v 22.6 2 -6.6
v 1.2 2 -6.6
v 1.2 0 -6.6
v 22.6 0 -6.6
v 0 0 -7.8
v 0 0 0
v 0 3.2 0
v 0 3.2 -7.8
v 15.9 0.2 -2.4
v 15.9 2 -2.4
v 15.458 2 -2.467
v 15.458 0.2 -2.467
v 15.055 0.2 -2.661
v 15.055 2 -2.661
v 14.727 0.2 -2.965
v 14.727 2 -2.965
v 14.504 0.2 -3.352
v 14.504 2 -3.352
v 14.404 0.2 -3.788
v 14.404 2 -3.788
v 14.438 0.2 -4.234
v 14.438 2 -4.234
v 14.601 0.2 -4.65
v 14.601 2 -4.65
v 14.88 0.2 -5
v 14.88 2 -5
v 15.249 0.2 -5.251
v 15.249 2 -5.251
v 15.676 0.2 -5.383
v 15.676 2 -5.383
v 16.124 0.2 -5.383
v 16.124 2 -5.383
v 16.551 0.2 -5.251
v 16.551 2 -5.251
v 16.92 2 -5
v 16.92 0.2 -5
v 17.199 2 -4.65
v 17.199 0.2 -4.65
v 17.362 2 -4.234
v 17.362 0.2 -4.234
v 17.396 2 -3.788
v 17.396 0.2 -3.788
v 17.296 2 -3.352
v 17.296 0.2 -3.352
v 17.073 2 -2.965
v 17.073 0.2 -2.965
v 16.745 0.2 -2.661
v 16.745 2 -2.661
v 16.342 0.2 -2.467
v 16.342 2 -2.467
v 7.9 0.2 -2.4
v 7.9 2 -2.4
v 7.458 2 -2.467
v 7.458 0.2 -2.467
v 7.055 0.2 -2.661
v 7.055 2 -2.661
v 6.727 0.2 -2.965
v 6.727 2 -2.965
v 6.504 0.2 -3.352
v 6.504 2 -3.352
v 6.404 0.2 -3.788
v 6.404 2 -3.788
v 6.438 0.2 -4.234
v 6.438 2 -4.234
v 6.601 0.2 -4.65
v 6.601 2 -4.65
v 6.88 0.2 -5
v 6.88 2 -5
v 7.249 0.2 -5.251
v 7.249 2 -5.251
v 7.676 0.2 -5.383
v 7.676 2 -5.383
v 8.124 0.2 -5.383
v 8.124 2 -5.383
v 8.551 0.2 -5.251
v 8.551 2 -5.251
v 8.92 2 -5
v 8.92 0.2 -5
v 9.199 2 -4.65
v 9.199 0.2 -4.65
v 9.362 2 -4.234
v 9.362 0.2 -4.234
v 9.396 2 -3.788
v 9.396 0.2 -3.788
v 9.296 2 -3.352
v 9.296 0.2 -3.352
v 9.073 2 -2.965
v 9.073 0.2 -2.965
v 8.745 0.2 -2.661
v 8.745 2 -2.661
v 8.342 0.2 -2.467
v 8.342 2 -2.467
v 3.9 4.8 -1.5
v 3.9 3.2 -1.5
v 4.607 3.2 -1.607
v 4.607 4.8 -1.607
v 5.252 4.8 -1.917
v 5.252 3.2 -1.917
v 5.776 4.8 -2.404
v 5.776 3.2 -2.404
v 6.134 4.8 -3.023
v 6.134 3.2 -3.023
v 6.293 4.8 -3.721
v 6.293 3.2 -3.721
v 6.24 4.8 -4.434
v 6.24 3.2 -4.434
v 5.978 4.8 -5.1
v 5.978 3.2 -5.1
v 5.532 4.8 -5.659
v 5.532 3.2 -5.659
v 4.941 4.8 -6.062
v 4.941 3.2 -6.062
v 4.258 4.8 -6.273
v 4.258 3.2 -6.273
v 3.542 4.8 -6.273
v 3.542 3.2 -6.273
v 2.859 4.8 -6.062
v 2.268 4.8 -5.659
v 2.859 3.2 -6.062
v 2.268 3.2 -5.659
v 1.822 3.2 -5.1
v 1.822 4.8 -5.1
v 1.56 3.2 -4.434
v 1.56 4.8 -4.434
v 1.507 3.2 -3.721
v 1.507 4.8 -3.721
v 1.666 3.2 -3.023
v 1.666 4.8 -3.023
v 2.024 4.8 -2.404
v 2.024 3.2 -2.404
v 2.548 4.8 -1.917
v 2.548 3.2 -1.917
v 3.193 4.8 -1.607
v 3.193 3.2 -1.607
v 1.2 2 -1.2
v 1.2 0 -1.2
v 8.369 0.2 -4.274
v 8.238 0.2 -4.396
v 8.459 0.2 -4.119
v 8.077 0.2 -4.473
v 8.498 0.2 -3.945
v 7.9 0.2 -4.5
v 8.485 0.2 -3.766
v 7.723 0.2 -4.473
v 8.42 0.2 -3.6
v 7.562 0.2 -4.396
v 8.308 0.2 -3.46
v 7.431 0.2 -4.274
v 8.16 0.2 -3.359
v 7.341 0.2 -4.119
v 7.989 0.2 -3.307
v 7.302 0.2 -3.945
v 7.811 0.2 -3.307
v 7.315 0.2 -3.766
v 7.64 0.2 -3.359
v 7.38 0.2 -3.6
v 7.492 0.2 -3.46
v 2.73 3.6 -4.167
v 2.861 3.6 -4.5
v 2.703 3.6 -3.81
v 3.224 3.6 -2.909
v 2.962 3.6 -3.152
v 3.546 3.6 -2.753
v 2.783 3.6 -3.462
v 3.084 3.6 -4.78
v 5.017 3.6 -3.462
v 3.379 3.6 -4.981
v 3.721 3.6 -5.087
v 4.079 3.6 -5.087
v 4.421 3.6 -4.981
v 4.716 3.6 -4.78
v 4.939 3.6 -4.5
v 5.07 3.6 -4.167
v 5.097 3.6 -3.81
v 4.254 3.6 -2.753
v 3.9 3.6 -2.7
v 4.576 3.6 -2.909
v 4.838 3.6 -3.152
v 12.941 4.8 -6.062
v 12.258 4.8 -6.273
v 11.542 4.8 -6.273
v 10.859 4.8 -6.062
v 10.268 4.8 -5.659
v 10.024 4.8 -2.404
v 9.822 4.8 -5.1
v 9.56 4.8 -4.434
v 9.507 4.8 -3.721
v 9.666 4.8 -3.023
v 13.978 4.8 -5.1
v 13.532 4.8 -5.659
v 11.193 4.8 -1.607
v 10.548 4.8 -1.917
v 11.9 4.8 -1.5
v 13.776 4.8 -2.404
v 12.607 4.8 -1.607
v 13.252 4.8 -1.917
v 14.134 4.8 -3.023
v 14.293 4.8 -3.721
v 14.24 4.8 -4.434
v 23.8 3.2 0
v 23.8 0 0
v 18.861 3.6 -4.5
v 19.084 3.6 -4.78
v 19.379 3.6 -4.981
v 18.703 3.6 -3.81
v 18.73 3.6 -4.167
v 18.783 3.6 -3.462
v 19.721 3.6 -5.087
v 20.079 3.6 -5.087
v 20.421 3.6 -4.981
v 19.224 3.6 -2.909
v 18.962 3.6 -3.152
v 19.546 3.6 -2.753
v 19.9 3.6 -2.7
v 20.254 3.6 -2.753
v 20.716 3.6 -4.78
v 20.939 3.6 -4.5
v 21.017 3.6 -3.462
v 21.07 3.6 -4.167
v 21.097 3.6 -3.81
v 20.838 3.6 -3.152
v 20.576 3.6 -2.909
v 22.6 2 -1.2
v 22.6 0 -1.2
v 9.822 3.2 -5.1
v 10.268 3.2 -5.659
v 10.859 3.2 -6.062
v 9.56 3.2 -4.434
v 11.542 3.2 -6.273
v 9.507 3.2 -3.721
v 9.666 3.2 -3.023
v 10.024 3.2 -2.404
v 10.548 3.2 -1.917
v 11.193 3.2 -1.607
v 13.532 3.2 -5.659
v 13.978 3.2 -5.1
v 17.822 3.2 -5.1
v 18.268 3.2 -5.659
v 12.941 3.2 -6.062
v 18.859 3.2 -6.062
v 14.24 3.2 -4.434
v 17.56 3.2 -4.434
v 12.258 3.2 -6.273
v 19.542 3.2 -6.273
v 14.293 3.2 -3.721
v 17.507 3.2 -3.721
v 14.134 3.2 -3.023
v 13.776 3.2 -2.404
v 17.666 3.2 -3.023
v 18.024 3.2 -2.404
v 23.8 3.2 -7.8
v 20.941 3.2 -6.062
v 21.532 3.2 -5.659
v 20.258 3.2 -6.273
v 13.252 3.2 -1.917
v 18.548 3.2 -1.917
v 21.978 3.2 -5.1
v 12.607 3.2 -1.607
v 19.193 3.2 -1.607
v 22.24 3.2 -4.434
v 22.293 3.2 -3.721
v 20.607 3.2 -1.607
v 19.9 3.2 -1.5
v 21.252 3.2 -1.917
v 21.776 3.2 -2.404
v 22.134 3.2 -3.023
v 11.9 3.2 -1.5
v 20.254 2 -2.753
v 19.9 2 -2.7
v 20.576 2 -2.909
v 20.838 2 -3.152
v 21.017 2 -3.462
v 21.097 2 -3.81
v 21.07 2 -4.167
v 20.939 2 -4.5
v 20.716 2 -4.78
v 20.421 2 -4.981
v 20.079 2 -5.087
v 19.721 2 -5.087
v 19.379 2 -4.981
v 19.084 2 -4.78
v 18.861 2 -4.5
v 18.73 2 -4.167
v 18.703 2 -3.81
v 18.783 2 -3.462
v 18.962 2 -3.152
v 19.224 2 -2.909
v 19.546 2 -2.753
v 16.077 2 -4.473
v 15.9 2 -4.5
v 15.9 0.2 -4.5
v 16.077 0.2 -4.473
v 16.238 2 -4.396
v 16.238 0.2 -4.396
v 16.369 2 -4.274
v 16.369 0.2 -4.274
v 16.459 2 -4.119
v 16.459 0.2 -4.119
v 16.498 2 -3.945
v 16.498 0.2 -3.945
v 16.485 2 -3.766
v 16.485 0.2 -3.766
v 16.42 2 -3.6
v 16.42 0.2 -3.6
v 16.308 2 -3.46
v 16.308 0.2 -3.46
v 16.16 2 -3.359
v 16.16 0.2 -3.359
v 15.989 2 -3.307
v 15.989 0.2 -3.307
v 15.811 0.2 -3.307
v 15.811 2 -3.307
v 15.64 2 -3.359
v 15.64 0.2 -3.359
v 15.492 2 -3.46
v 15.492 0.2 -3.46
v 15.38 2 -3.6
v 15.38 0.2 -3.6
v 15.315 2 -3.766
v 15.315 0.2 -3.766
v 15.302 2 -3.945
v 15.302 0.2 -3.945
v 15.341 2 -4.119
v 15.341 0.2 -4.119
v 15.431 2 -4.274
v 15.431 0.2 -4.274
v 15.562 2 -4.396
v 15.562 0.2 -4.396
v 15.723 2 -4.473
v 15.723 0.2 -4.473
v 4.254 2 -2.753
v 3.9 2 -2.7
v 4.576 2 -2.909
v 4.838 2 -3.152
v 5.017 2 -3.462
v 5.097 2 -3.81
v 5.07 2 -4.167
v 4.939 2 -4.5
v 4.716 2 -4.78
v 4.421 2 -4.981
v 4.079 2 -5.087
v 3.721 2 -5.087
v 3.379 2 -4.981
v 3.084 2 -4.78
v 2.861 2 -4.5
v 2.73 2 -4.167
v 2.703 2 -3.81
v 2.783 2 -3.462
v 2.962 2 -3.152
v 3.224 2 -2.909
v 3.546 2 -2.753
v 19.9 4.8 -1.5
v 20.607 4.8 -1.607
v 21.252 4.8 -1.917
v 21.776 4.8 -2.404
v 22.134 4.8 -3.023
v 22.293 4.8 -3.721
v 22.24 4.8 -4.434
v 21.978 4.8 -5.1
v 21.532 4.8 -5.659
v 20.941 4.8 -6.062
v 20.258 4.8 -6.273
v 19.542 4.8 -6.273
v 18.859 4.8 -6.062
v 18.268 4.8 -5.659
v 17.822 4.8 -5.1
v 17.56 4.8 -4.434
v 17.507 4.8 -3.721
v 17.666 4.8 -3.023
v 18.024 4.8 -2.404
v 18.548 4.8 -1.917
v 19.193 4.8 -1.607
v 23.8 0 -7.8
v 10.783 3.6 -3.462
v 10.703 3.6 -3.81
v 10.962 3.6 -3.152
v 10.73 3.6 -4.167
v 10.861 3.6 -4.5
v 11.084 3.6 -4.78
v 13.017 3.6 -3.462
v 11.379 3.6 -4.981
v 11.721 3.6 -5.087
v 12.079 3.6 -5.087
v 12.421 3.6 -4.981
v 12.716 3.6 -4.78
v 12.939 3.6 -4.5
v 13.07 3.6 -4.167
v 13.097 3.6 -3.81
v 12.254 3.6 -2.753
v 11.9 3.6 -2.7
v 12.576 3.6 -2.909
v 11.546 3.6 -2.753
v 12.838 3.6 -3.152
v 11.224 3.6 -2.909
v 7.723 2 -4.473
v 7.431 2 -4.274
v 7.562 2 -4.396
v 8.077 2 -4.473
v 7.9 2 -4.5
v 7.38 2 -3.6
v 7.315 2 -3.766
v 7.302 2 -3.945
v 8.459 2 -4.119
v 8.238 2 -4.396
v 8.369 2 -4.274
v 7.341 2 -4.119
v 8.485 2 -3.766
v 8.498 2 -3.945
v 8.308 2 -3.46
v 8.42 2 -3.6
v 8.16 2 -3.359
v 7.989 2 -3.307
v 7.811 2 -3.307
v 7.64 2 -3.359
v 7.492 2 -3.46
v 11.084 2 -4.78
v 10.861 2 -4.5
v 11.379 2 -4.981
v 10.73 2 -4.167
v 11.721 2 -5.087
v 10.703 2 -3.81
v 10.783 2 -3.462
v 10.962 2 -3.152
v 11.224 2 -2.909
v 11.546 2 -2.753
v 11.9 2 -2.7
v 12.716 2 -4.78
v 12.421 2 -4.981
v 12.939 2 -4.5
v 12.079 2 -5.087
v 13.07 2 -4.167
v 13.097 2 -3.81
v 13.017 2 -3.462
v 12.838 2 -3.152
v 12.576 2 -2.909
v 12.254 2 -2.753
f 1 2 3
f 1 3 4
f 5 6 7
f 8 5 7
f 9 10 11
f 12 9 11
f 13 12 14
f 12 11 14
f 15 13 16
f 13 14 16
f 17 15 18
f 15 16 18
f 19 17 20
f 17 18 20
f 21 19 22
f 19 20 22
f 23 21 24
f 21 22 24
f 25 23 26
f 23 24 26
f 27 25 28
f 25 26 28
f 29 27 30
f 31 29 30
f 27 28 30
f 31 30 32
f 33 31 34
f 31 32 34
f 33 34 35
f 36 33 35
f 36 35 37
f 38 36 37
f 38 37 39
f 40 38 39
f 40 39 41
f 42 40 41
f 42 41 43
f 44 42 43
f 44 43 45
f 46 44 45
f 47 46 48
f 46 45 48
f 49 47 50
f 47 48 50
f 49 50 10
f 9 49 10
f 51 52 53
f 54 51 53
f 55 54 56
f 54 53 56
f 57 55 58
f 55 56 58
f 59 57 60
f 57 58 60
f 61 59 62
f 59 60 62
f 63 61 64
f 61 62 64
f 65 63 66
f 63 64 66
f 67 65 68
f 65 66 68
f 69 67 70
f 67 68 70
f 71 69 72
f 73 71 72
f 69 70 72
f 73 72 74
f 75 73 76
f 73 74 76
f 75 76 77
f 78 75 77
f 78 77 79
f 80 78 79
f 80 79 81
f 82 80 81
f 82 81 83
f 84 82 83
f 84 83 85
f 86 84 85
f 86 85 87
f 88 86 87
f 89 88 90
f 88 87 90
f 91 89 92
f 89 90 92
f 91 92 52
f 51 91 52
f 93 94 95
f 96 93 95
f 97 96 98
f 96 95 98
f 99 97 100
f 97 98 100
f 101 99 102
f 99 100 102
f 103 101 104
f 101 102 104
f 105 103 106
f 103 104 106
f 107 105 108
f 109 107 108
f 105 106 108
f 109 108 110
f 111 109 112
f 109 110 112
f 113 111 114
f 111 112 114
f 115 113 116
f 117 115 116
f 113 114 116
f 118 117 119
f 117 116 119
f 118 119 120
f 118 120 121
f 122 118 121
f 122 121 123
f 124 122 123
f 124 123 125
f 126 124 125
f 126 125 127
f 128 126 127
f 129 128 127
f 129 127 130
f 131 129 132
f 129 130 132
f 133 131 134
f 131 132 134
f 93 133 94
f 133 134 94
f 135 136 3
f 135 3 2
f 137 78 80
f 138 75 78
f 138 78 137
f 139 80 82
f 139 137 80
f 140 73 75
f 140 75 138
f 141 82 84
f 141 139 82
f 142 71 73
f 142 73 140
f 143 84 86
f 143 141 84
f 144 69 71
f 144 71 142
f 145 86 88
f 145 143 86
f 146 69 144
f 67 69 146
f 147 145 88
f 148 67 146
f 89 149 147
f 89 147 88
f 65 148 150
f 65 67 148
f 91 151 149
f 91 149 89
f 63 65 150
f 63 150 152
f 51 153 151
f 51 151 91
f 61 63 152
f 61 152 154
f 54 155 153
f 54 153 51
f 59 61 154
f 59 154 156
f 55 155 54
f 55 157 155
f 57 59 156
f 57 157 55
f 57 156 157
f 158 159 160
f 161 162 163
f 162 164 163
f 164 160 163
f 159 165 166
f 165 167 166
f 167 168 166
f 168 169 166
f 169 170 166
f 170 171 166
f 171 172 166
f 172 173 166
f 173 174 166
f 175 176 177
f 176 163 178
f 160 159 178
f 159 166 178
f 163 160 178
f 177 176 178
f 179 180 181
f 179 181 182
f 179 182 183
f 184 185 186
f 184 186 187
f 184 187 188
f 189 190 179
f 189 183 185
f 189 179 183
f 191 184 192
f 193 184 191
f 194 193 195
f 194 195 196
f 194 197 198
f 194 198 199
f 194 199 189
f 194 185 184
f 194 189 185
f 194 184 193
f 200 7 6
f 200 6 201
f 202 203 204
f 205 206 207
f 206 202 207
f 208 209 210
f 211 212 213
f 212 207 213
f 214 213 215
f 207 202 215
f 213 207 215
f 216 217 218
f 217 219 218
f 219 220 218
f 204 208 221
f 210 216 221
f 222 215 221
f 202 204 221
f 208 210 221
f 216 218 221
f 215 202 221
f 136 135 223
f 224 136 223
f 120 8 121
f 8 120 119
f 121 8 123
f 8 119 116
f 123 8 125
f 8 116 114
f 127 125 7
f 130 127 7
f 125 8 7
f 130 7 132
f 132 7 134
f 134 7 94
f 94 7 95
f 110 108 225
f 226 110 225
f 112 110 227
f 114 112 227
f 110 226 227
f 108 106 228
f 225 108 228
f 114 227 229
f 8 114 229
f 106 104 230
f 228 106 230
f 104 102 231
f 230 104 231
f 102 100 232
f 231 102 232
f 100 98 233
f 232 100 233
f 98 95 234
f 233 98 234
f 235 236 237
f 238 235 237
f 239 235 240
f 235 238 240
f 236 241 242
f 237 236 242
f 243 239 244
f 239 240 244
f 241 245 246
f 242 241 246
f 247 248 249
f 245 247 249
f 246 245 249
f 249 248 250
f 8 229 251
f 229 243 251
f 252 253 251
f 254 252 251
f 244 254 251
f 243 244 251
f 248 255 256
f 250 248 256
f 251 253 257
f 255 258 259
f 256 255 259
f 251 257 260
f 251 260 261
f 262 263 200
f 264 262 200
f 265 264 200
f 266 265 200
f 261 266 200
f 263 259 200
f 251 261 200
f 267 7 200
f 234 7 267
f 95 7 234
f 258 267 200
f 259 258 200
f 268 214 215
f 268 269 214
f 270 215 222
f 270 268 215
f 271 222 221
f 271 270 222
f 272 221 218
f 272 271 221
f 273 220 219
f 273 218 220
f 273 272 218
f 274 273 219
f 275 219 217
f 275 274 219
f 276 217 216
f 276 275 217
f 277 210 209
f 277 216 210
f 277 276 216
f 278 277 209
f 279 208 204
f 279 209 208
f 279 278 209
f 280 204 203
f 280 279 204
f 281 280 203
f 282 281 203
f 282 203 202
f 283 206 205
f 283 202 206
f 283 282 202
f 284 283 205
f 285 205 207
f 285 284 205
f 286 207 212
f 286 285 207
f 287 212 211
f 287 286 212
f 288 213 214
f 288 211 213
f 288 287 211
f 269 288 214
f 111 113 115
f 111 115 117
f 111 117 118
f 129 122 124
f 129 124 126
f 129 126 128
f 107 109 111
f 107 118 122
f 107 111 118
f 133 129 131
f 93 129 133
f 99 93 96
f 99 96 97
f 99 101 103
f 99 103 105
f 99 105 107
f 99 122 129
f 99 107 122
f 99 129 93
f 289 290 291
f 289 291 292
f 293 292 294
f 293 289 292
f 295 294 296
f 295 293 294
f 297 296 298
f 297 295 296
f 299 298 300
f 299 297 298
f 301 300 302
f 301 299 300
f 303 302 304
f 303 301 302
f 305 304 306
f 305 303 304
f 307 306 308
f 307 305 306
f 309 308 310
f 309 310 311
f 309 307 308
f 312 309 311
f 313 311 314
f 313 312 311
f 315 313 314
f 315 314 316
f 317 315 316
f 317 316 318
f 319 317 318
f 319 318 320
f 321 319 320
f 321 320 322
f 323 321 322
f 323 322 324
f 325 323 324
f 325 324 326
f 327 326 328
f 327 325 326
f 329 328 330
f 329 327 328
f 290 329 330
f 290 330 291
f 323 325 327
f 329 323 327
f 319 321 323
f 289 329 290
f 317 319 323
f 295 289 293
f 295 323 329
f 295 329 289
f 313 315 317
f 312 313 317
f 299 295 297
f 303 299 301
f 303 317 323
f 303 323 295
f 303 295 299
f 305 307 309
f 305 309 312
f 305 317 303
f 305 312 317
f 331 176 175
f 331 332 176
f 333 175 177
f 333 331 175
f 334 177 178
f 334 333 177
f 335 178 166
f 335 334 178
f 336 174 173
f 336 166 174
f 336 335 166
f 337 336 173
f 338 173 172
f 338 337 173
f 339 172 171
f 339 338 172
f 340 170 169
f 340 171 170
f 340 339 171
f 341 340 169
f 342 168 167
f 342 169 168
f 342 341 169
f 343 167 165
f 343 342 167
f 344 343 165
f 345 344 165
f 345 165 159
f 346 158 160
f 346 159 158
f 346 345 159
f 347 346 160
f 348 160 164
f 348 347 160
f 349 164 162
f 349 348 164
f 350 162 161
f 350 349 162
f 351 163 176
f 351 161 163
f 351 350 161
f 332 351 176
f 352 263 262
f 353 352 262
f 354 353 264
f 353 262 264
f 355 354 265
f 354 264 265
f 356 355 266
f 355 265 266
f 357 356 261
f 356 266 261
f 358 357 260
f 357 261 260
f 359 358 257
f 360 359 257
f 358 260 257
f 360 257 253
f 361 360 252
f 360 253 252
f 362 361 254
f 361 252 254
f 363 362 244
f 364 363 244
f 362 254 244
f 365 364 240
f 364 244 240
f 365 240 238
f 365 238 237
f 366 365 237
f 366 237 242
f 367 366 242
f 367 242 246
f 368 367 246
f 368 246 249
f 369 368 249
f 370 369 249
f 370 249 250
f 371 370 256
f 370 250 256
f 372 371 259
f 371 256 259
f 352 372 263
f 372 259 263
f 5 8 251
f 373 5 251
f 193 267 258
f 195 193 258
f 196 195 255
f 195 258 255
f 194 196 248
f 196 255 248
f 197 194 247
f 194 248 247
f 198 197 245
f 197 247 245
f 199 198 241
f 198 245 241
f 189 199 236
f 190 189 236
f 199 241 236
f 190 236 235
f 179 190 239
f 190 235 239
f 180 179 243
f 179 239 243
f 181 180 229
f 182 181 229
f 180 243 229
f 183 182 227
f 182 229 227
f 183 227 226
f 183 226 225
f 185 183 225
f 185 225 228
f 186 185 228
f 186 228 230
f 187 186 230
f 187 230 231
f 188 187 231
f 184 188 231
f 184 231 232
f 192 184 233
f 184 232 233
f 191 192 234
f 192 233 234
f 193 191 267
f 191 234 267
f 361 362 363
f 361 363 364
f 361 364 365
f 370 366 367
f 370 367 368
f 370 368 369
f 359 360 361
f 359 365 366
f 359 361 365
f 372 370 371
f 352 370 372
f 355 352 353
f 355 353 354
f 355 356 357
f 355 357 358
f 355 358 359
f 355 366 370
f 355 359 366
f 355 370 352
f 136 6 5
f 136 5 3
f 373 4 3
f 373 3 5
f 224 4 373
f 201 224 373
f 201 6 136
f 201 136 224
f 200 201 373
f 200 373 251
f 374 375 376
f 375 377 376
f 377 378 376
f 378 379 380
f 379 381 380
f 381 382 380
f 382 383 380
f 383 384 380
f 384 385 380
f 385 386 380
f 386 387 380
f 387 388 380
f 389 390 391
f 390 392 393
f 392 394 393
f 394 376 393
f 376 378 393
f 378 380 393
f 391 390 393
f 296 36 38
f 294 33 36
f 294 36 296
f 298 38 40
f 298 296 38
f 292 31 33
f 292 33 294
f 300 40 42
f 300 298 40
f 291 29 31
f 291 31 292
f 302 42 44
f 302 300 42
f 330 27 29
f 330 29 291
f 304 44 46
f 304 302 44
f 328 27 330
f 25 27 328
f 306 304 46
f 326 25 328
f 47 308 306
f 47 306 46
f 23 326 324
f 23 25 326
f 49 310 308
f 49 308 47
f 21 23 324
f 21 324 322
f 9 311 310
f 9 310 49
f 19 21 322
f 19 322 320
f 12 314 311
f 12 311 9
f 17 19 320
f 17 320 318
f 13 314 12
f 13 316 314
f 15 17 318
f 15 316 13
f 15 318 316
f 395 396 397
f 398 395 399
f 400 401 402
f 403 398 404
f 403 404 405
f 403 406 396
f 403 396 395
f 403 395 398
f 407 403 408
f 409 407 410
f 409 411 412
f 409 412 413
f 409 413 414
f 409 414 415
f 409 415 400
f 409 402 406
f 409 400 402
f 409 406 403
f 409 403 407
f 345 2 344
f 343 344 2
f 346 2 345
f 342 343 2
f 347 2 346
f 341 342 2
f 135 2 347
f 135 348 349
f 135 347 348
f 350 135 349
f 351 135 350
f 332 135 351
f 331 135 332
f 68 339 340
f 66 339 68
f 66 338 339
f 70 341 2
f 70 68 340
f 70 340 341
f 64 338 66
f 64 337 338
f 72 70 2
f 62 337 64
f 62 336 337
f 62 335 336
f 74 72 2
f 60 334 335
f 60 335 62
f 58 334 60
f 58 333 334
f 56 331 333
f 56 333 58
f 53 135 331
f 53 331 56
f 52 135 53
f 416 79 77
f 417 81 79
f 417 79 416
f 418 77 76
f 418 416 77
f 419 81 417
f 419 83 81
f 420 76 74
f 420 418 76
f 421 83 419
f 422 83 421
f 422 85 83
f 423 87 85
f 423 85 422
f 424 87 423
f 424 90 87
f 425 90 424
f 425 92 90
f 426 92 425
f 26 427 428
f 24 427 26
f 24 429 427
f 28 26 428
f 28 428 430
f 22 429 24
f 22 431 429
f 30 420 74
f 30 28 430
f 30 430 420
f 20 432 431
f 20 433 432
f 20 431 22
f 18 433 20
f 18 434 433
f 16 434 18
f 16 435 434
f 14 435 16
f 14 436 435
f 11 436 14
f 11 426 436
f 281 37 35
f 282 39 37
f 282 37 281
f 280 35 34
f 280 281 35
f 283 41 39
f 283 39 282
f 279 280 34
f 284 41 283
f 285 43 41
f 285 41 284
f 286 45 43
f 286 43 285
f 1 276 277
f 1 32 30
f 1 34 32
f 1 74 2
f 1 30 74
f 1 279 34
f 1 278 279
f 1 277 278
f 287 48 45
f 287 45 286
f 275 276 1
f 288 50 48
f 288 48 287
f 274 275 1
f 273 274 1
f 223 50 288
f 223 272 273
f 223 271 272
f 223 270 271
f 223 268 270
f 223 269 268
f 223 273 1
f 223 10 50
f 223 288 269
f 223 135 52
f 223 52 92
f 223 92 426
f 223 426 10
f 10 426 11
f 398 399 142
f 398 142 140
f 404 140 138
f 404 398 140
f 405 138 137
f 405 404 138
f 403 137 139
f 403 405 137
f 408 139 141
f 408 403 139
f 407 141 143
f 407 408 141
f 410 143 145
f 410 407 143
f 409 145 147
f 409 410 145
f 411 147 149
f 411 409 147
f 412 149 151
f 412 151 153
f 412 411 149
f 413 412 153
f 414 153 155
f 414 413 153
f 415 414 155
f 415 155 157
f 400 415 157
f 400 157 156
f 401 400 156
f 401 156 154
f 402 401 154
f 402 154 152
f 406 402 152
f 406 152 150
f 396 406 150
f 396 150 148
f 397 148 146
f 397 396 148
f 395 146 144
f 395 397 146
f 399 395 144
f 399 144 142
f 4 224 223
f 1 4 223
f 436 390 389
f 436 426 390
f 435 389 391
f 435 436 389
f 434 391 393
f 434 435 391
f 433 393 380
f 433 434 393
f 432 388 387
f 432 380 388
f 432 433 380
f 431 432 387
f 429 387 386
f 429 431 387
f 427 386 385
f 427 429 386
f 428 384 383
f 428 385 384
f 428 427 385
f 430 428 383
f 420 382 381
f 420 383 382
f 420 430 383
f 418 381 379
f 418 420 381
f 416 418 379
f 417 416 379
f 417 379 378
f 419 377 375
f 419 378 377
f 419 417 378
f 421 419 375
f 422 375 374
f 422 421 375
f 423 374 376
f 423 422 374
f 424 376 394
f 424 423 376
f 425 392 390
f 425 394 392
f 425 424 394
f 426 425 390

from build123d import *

# Parameters (mm, degrees)
SKETCH1_W            = 23.8
SKETCH1_H            = 3.2
BOSS_EXTRUDE1_DEPTH  = 7.8
SKETCH2_R            = 2.4
BOSS_EXTRUDE2_DEPTH  = 1.6
LPATTERN1_COUNT      = 2
LPATTERN1_PITCH      = 8
LPATTERN1_COUNT_DIR2 = 4
LPATTERN1_PITCH_DIR2 = 8
SHELL1_T             = -1.2
SKETCH3_R            = 1.5
SKETCH3_R_2          = 0.6
BOSS_EXTRUDE3_DEPTH  = 1.8
LPATTERN2_COUNT      = 2
LPATTERN2_PITCH      = 8


with BuildPart() as part:
    # Sketch1 → Boss-Extrude1 (new body)
    with BuildSketch(Plane.XY):
        with Locations((11.9, 1.6)):
            Rectangle(SKETCH1_W, SKETCH1_H)
    extrude(amount=-BOSS_EXTRUDE1_DEPTH)

    # Sketch2 → Boss-Extrude2 (add)
    with BuildSketch(Plane(origin=(0, 3.2, 0), x_dir=(1, 0, 0), z_dir=(0, 1, 0))):
        with Locations(Location((3.9, 3.9, 0), (0, 0, 270))):
            Circle(SKETCH2_R)
    boss_extrude2 = extrude(amount=BOSS_EXTRUDE2_DEPTH)

    # LPattern1: Boss-Extrude2 2 × 4, 5 skipped
    with Locations(*[(j * LPATTERN1_PITCH_DIR2, 0, i * LPATTERN1_PITCH) for i in range(LPATTERN1_COUNT) for j in range(LPATTERN1_COUNT_DIR2) if (i, j) not in ((0, 0), (0, 3), (1, 0), (1, 1), (1, 2), (1, 3))]):
        add(boss_extrude2)

    # Shell1
    shell1_openings = [part.faces().sort_by_distance(p)[0] for p in [
        (11.9, 0, -3.9),
    ]]
    offset(amount=SHELL1_T, openings=shell1_openings, kind=Kind.INTERSECTION)

    # Sketch3 → Boss-Extrude3 (add)
    with BuildSketch(Plane.XZ.offset(-2)):
        with Locations(Location((7.9, -3.9, 0), (0, 0, 90))):
            Circle(SKETCH3_R)
        with Locations(Location((7.9, -3.9, 0), (0, 0, 270))):
            Circle(SKETCH3_R_2, mode=Mode.SUBTRACT)
    boss_extrude3 = extrude(amount=BOSS_EXTRUDE3_DEPTH)

    # LPattern2: Boss-Extrude3 ×2
    with Locations(*[(i * LPATTERN2_PITCH, 0, 0) for i in range(1, LPATTERN2_COUNT)]):
        add(boss_extrude3)


solid = part.part
